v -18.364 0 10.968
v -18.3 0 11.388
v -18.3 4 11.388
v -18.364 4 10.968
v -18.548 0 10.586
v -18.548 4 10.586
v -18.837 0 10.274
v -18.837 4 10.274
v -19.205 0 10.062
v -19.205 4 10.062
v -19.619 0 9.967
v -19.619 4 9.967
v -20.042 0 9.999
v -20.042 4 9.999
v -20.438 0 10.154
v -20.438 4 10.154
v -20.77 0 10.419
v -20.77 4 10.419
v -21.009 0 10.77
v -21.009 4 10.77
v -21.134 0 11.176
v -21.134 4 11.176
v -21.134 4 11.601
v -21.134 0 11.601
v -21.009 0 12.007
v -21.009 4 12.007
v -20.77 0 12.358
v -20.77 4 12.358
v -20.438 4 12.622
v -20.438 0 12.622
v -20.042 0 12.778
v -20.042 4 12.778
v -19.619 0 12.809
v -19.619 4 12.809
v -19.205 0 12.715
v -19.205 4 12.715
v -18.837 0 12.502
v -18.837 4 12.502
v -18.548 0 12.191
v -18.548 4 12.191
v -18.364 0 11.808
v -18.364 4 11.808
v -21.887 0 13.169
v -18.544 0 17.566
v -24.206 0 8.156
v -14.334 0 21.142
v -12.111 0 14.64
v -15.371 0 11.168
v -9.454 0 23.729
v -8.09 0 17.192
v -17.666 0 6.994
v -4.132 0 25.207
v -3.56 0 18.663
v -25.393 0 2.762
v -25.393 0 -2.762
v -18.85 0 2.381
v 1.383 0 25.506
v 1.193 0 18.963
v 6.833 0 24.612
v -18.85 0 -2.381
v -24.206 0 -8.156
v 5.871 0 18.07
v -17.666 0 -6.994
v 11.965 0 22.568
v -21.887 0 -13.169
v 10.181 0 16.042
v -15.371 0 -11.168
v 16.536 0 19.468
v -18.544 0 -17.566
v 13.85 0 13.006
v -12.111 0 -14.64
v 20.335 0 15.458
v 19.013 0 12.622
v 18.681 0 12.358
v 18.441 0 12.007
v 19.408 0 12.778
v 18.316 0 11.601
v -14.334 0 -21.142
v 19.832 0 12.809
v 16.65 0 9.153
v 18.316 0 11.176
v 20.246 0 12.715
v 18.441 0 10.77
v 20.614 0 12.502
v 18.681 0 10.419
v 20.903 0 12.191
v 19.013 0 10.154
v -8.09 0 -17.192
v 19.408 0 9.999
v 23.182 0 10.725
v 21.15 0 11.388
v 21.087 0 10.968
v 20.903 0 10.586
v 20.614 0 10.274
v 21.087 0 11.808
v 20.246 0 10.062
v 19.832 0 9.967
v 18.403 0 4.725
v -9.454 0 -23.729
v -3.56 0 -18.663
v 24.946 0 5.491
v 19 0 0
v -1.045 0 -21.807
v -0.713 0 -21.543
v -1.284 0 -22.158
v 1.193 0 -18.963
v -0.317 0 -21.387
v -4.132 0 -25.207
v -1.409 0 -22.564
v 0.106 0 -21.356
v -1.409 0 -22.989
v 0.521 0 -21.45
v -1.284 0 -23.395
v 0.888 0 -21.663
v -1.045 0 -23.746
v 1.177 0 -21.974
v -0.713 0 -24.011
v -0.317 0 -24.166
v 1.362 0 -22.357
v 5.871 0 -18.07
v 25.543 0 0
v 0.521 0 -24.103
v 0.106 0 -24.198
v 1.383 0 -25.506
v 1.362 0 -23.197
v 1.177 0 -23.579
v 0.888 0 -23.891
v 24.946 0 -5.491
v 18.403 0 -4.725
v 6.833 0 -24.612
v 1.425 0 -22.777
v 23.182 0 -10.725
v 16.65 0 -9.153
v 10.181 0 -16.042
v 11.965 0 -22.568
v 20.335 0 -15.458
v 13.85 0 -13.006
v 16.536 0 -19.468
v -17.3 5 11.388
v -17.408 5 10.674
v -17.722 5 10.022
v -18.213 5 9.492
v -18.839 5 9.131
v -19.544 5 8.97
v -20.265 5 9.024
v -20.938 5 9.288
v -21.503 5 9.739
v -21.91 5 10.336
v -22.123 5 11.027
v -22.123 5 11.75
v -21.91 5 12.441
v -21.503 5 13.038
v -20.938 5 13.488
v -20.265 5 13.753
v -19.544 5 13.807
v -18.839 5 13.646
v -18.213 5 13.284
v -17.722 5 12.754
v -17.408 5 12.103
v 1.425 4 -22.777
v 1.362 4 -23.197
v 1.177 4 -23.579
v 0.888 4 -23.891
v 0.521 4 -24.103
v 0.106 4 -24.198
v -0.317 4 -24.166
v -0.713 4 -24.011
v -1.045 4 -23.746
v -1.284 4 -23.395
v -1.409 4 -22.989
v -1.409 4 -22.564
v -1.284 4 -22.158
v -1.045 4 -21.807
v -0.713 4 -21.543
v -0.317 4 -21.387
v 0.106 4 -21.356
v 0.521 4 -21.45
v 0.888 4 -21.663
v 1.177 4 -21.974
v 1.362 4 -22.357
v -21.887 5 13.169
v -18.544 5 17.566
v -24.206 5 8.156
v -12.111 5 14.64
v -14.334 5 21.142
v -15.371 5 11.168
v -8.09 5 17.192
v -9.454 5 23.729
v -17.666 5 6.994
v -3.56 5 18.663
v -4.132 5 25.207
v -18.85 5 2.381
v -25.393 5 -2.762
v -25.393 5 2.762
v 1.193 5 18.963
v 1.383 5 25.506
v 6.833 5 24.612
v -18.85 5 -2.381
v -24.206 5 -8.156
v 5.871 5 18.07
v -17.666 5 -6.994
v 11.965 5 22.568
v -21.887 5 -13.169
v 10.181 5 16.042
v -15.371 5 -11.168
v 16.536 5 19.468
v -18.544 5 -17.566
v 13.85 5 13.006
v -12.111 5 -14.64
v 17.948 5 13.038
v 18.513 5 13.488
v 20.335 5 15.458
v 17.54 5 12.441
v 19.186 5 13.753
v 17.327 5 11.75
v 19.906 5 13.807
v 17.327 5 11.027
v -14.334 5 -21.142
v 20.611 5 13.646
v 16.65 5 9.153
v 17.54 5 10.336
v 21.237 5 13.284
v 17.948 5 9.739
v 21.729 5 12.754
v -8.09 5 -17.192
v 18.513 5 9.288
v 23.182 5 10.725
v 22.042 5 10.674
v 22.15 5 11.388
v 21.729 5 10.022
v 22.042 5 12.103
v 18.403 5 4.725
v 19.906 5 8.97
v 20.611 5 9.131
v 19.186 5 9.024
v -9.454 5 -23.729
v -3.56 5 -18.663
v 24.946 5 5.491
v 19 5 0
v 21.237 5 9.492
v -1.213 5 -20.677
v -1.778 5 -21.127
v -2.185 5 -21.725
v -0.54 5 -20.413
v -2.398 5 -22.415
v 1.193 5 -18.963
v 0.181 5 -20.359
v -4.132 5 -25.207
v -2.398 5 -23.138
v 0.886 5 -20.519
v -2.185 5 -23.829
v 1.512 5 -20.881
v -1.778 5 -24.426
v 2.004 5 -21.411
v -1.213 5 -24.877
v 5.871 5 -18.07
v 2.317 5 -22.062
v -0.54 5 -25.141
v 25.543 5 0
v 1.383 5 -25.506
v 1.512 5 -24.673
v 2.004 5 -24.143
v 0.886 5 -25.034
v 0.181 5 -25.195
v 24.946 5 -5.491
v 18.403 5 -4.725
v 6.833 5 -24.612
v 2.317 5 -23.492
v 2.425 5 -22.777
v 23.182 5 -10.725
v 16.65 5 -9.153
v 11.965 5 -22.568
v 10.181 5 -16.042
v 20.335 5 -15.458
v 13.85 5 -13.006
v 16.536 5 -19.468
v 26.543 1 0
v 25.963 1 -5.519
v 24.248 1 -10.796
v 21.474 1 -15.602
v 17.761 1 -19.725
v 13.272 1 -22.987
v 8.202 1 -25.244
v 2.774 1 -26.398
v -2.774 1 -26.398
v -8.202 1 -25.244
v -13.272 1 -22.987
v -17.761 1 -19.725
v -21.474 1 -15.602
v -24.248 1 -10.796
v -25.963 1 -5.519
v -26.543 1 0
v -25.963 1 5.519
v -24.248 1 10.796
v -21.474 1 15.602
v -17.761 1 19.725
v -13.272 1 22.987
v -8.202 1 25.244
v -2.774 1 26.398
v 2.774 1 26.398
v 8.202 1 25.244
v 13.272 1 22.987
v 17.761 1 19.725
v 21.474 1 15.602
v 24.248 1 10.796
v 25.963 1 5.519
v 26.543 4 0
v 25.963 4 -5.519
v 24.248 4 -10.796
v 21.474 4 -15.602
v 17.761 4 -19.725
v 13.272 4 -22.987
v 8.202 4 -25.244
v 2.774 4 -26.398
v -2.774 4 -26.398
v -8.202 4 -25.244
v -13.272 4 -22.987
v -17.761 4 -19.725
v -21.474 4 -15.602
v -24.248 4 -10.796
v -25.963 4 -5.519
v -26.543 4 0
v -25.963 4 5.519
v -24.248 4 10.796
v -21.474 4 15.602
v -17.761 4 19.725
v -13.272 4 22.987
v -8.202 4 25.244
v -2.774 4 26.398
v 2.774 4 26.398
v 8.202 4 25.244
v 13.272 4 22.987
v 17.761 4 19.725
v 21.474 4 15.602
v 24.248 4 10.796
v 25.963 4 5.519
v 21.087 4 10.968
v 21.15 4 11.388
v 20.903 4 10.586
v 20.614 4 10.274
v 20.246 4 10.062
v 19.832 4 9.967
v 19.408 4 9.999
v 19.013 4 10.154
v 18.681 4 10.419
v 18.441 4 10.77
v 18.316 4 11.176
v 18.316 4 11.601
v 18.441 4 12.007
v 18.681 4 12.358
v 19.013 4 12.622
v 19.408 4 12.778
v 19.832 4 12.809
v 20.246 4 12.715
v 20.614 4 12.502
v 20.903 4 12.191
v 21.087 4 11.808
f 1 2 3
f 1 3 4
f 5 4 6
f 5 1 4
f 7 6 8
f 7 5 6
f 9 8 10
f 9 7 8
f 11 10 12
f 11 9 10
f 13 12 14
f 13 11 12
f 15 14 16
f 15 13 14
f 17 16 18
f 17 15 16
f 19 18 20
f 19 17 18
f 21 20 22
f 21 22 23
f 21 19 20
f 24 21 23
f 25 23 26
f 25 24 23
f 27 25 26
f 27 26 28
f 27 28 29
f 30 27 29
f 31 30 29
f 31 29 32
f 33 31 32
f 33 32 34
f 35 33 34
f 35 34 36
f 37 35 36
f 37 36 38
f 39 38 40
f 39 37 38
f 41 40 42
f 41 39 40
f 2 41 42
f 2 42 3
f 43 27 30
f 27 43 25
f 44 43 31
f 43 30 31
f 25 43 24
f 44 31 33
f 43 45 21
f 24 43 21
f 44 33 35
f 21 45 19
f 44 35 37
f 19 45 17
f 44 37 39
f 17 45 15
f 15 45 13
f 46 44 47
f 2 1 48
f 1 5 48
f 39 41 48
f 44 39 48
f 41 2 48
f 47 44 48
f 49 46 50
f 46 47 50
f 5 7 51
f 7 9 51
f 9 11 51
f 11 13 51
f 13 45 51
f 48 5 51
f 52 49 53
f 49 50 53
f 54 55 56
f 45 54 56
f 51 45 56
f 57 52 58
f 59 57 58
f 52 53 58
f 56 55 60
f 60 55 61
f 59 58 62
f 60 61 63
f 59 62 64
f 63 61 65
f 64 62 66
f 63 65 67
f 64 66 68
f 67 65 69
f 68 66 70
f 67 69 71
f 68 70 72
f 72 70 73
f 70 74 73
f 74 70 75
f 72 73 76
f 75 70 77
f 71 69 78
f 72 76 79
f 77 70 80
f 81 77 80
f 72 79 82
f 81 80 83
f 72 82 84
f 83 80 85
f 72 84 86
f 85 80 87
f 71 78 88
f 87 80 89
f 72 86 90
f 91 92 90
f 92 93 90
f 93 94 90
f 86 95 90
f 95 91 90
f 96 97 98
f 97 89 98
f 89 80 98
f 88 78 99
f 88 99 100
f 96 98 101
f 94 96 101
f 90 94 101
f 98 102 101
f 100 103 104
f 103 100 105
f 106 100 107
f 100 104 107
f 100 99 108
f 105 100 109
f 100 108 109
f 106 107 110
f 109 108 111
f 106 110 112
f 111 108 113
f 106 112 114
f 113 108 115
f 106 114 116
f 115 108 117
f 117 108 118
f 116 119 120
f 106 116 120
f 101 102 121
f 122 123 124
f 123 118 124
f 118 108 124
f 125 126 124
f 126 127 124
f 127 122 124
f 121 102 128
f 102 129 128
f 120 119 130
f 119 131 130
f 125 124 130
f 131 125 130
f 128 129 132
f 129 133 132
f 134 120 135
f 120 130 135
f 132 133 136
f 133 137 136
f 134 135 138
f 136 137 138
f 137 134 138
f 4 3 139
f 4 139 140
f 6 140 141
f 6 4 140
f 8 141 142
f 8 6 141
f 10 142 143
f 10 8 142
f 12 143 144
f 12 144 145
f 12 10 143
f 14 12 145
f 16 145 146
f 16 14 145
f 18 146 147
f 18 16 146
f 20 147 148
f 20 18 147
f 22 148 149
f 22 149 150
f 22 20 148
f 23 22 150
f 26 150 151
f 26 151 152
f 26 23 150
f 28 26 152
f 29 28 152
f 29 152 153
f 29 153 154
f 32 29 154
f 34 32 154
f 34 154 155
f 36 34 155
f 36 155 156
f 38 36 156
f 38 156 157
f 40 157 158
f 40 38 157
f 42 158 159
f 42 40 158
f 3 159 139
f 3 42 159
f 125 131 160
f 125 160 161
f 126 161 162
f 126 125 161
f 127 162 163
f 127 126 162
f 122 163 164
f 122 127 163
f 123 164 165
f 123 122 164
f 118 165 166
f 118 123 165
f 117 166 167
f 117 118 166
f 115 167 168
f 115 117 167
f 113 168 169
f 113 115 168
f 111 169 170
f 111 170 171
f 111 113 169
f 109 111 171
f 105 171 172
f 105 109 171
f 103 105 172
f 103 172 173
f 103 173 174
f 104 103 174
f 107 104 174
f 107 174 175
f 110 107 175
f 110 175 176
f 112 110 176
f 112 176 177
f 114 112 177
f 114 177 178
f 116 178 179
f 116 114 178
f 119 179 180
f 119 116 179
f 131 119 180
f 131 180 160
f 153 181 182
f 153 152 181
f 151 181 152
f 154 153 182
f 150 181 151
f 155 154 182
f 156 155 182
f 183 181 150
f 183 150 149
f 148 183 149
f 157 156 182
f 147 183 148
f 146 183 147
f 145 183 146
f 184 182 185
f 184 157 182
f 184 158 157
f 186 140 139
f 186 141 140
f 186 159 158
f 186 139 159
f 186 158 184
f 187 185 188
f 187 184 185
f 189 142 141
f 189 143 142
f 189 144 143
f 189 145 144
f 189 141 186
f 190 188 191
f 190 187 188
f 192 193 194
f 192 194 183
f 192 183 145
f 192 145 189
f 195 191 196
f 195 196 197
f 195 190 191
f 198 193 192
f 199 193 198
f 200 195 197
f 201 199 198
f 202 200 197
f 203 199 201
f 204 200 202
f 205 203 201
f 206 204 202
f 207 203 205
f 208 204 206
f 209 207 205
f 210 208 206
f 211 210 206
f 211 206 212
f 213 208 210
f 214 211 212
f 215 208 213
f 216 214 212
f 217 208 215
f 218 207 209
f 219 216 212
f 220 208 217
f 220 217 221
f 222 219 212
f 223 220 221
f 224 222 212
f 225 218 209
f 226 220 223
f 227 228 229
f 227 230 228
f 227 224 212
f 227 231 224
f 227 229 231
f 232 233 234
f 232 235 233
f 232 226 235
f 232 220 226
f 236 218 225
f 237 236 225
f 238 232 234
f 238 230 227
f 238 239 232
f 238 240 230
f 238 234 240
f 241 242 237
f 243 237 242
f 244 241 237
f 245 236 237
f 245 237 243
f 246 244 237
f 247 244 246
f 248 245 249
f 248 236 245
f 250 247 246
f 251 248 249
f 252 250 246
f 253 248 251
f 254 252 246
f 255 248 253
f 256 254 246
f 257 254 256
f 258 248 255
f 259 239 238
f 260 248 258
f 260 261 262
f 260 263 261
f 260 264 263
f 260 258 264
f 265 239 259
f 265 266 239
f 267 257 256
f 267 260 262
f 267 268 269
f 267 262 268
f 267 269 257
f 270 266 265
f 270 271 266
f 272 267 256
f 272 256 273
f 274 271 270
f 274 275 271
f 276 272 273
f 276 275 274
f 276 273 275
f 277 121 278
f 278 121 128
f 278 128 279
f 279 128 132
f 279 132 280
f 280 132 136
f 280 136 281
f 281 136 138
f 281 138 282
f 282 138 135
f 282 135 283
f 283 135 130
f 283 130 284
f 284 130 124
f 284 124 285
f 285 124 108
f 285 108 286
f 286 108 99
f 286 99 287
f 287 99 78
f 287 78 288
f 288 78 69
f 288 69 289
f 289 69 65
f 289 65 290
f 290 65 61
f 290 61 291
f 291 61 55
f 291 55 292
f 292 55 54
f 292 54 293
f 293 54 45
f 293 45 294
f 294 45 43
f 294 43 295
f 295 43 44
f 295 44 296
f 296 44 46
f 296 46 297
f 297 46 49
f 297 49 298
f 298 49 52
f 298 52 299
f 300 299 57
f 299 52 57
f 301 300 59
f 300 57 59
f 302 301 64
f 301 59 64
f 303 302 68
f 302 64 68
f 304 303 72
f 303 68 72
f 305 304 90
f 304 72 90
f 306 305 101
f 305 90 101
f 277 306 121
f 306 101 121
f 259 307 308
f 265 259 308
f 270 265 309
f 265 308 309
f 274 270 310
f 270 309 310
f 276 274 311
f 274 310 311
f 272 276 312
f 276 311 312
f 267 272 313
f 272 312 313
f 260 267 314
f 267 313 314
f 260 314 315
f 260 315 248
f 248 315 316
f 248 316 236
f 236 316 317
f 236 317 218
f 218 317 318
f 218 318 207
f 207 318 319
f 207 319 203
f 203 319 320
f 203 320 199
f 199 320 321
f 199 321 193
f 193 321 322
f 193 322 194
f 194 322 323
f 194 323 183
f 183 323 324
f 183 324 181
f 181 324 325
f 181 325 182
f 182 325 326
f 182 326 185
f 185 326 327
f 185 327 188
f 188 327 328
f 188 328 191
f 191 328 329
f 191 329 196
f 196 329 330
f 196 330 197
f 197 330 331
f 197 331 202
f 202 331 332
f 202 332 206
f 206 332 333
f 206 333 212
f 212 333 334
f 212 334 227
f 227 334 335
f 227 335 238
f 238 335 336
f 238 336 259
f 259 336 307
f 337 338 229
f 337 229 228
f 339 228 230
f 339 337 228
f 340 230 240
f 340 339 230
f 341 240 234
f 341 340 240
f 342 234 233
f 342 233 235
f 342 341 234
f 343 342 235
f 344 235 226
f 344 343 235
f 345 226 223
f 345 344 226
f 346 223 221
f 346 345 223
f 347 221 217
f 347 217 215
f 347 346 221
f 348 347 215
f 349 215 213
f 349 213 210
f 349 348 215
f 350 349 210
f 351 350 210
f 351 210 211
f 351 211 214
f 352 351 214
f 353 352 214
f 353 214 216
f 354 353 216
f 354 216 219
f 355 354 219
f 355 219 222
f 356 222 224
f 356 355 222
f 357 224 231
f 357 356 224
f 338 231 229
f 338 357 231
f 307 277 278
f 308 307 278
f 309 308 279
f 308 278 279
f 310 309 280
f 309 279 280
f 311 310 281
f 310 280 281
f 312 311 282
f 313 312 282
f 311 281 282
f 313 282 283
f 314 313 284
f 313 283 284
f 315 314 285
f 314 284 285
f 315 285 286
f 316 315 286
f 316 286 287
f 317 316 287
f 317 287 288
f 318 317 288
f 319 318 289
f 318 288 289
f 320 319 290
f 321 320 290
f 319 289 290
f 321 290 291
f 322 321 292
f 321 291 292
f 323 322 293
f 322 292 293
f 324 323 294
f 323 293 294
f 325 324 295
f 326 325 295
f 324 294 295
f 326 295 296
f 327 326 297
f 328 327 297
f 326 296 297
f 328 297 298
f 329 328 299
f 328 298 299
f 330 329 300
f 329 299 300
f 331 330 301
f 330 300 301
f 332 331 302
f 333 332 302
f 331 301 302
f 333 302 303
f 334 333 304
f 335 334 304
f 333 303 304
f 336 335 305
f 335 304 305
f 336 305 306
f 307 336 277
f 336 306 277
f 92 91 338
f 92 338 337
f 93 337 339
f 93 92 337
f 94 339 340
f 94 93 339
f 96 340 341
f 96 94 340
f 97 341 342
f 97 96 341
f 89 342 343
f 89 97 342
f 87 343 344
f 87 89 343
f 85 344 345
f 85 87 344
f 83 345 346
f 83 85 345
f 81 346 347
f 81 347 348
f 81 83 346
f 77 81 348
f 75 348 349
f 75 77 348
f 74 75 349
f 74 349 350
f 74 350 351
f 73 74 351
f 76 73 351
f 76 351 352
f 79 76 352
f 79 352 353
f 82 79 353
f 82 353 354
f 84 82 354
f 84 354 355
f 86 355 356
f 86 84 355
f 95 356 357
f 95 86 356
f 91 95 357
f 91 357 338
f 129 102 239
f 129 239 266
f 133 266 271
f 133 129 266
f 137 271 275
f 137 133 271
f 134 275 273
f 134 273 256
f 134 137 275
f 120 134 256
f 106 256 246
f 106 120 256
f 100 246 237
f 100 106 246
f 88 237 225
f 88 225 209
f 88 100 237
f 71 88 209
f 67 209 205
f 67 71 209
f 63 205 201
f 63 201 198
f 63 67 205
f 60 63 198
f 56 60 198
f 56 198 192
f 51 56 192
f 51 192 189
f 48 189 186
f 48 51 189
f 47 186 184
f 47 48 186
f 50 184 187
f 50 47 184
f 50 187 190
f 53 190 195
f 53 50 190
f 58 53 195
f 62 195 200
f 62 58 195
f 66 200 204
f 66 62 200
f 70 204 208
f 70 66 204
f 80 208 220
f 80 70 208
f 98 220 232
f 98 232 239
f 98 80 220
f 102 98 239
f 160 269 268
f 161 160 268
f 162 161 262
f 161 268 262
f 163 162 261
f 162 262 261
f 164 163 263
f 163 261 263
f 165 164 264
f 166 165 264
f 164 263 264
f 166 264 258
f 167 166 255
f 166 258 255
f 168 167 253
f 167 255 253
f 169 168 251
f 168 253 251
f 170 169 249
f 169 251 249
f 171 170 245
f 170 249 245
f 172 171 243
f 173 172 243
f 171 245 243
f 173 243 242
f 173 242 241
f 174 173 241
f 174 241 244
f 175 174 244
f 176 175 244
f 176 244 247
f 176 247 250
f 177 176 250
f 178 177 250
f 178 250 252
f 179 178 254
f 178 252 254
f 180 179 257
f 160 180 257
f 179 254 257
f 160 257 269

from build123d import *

# Parameters (mm, degrees)
SKETCH1_R           = 26.543
SKETCH1_R_2         = 19
SKETCH1_R_3         = 1.425
BOSS_EXTRUDE1_DEPTH = 5
CHAMFER1_SIZE       = 1
CHAMFER2_SIZE       = 1
CHAMFER3_SIZE       = 1
CHAMFER4_SIZE       = 1
CHAMFER5_SIZE       = 1


with BuildPart() as part:
    # Sketch1 → Boss-Extrude1 (new body)
    with BuildSketch(Plane(origin=(0, 0, 0), x_dir=(1, 0, 0), z_dir=(0, 1, 0))):
        Circle(SKETCH1_R)
        Circle(SKETCH1_R_2, mode=Mode.SUBTRACT)
        with Locations((0, 22.776724903)):
            Circle(SKETCH1_R_3, mode=Mode.SUBTRACT)
        with Locations((19.725222381, -11.388362451)):
            Circle(SKETCH1_R_3, mode=Mode.SUBTRACT)
        with Locations((-19.725222381, -11.388362451)):
            Circle(SKETCH1_R_3, mode=Mode.SUBTRACT)
    extrude(amount=BOSS_EXTRUDE1_DEPTH)

    # Chamfer1
    chamfer1_edges = [part.edges().sort_by_distance(p)[0] for p in [
        (-1.425, 5, -22.776724903),
    ]]
    chamfer(chamfer1_edges, length=CHAMFER1_SIZE)

    # Chamfer2
    chamfer2_edges = [part.edges().sort_by_distance(p)[0] for p in [
        (-21.150222381, 5, 11.388362451),
    ]]
    chamfer(chamfer2_edges, length=CHAMFER2_SIZE)

    # Chamfer3
    chamfer3_edges = [part.edges().sort_by_distance(p)[0] for p in [
        (18.300222381, 5, 11.388362451),
    ]]
    chamfer(chamfer3_edges, length=CHAMFER3_SIZE)

    # Chamfer4
    chamfer4_edges = [part.edges().sort_by_distance(p)[0] for p in [
        (-26.543, 5, 0),
    ]]
    chamfer(chamfer4_edges, length=CHAMFER4_SIZE)

    # Chamfer5
    chamfer5_edges = [part.edges().sort_by_distance(p)[0] for p in [
        (-26.543, 0, 0),
    ]]
    chamfer(chamfer5_edges, length=CHAMFER5_SIZE)


solid = part.part
